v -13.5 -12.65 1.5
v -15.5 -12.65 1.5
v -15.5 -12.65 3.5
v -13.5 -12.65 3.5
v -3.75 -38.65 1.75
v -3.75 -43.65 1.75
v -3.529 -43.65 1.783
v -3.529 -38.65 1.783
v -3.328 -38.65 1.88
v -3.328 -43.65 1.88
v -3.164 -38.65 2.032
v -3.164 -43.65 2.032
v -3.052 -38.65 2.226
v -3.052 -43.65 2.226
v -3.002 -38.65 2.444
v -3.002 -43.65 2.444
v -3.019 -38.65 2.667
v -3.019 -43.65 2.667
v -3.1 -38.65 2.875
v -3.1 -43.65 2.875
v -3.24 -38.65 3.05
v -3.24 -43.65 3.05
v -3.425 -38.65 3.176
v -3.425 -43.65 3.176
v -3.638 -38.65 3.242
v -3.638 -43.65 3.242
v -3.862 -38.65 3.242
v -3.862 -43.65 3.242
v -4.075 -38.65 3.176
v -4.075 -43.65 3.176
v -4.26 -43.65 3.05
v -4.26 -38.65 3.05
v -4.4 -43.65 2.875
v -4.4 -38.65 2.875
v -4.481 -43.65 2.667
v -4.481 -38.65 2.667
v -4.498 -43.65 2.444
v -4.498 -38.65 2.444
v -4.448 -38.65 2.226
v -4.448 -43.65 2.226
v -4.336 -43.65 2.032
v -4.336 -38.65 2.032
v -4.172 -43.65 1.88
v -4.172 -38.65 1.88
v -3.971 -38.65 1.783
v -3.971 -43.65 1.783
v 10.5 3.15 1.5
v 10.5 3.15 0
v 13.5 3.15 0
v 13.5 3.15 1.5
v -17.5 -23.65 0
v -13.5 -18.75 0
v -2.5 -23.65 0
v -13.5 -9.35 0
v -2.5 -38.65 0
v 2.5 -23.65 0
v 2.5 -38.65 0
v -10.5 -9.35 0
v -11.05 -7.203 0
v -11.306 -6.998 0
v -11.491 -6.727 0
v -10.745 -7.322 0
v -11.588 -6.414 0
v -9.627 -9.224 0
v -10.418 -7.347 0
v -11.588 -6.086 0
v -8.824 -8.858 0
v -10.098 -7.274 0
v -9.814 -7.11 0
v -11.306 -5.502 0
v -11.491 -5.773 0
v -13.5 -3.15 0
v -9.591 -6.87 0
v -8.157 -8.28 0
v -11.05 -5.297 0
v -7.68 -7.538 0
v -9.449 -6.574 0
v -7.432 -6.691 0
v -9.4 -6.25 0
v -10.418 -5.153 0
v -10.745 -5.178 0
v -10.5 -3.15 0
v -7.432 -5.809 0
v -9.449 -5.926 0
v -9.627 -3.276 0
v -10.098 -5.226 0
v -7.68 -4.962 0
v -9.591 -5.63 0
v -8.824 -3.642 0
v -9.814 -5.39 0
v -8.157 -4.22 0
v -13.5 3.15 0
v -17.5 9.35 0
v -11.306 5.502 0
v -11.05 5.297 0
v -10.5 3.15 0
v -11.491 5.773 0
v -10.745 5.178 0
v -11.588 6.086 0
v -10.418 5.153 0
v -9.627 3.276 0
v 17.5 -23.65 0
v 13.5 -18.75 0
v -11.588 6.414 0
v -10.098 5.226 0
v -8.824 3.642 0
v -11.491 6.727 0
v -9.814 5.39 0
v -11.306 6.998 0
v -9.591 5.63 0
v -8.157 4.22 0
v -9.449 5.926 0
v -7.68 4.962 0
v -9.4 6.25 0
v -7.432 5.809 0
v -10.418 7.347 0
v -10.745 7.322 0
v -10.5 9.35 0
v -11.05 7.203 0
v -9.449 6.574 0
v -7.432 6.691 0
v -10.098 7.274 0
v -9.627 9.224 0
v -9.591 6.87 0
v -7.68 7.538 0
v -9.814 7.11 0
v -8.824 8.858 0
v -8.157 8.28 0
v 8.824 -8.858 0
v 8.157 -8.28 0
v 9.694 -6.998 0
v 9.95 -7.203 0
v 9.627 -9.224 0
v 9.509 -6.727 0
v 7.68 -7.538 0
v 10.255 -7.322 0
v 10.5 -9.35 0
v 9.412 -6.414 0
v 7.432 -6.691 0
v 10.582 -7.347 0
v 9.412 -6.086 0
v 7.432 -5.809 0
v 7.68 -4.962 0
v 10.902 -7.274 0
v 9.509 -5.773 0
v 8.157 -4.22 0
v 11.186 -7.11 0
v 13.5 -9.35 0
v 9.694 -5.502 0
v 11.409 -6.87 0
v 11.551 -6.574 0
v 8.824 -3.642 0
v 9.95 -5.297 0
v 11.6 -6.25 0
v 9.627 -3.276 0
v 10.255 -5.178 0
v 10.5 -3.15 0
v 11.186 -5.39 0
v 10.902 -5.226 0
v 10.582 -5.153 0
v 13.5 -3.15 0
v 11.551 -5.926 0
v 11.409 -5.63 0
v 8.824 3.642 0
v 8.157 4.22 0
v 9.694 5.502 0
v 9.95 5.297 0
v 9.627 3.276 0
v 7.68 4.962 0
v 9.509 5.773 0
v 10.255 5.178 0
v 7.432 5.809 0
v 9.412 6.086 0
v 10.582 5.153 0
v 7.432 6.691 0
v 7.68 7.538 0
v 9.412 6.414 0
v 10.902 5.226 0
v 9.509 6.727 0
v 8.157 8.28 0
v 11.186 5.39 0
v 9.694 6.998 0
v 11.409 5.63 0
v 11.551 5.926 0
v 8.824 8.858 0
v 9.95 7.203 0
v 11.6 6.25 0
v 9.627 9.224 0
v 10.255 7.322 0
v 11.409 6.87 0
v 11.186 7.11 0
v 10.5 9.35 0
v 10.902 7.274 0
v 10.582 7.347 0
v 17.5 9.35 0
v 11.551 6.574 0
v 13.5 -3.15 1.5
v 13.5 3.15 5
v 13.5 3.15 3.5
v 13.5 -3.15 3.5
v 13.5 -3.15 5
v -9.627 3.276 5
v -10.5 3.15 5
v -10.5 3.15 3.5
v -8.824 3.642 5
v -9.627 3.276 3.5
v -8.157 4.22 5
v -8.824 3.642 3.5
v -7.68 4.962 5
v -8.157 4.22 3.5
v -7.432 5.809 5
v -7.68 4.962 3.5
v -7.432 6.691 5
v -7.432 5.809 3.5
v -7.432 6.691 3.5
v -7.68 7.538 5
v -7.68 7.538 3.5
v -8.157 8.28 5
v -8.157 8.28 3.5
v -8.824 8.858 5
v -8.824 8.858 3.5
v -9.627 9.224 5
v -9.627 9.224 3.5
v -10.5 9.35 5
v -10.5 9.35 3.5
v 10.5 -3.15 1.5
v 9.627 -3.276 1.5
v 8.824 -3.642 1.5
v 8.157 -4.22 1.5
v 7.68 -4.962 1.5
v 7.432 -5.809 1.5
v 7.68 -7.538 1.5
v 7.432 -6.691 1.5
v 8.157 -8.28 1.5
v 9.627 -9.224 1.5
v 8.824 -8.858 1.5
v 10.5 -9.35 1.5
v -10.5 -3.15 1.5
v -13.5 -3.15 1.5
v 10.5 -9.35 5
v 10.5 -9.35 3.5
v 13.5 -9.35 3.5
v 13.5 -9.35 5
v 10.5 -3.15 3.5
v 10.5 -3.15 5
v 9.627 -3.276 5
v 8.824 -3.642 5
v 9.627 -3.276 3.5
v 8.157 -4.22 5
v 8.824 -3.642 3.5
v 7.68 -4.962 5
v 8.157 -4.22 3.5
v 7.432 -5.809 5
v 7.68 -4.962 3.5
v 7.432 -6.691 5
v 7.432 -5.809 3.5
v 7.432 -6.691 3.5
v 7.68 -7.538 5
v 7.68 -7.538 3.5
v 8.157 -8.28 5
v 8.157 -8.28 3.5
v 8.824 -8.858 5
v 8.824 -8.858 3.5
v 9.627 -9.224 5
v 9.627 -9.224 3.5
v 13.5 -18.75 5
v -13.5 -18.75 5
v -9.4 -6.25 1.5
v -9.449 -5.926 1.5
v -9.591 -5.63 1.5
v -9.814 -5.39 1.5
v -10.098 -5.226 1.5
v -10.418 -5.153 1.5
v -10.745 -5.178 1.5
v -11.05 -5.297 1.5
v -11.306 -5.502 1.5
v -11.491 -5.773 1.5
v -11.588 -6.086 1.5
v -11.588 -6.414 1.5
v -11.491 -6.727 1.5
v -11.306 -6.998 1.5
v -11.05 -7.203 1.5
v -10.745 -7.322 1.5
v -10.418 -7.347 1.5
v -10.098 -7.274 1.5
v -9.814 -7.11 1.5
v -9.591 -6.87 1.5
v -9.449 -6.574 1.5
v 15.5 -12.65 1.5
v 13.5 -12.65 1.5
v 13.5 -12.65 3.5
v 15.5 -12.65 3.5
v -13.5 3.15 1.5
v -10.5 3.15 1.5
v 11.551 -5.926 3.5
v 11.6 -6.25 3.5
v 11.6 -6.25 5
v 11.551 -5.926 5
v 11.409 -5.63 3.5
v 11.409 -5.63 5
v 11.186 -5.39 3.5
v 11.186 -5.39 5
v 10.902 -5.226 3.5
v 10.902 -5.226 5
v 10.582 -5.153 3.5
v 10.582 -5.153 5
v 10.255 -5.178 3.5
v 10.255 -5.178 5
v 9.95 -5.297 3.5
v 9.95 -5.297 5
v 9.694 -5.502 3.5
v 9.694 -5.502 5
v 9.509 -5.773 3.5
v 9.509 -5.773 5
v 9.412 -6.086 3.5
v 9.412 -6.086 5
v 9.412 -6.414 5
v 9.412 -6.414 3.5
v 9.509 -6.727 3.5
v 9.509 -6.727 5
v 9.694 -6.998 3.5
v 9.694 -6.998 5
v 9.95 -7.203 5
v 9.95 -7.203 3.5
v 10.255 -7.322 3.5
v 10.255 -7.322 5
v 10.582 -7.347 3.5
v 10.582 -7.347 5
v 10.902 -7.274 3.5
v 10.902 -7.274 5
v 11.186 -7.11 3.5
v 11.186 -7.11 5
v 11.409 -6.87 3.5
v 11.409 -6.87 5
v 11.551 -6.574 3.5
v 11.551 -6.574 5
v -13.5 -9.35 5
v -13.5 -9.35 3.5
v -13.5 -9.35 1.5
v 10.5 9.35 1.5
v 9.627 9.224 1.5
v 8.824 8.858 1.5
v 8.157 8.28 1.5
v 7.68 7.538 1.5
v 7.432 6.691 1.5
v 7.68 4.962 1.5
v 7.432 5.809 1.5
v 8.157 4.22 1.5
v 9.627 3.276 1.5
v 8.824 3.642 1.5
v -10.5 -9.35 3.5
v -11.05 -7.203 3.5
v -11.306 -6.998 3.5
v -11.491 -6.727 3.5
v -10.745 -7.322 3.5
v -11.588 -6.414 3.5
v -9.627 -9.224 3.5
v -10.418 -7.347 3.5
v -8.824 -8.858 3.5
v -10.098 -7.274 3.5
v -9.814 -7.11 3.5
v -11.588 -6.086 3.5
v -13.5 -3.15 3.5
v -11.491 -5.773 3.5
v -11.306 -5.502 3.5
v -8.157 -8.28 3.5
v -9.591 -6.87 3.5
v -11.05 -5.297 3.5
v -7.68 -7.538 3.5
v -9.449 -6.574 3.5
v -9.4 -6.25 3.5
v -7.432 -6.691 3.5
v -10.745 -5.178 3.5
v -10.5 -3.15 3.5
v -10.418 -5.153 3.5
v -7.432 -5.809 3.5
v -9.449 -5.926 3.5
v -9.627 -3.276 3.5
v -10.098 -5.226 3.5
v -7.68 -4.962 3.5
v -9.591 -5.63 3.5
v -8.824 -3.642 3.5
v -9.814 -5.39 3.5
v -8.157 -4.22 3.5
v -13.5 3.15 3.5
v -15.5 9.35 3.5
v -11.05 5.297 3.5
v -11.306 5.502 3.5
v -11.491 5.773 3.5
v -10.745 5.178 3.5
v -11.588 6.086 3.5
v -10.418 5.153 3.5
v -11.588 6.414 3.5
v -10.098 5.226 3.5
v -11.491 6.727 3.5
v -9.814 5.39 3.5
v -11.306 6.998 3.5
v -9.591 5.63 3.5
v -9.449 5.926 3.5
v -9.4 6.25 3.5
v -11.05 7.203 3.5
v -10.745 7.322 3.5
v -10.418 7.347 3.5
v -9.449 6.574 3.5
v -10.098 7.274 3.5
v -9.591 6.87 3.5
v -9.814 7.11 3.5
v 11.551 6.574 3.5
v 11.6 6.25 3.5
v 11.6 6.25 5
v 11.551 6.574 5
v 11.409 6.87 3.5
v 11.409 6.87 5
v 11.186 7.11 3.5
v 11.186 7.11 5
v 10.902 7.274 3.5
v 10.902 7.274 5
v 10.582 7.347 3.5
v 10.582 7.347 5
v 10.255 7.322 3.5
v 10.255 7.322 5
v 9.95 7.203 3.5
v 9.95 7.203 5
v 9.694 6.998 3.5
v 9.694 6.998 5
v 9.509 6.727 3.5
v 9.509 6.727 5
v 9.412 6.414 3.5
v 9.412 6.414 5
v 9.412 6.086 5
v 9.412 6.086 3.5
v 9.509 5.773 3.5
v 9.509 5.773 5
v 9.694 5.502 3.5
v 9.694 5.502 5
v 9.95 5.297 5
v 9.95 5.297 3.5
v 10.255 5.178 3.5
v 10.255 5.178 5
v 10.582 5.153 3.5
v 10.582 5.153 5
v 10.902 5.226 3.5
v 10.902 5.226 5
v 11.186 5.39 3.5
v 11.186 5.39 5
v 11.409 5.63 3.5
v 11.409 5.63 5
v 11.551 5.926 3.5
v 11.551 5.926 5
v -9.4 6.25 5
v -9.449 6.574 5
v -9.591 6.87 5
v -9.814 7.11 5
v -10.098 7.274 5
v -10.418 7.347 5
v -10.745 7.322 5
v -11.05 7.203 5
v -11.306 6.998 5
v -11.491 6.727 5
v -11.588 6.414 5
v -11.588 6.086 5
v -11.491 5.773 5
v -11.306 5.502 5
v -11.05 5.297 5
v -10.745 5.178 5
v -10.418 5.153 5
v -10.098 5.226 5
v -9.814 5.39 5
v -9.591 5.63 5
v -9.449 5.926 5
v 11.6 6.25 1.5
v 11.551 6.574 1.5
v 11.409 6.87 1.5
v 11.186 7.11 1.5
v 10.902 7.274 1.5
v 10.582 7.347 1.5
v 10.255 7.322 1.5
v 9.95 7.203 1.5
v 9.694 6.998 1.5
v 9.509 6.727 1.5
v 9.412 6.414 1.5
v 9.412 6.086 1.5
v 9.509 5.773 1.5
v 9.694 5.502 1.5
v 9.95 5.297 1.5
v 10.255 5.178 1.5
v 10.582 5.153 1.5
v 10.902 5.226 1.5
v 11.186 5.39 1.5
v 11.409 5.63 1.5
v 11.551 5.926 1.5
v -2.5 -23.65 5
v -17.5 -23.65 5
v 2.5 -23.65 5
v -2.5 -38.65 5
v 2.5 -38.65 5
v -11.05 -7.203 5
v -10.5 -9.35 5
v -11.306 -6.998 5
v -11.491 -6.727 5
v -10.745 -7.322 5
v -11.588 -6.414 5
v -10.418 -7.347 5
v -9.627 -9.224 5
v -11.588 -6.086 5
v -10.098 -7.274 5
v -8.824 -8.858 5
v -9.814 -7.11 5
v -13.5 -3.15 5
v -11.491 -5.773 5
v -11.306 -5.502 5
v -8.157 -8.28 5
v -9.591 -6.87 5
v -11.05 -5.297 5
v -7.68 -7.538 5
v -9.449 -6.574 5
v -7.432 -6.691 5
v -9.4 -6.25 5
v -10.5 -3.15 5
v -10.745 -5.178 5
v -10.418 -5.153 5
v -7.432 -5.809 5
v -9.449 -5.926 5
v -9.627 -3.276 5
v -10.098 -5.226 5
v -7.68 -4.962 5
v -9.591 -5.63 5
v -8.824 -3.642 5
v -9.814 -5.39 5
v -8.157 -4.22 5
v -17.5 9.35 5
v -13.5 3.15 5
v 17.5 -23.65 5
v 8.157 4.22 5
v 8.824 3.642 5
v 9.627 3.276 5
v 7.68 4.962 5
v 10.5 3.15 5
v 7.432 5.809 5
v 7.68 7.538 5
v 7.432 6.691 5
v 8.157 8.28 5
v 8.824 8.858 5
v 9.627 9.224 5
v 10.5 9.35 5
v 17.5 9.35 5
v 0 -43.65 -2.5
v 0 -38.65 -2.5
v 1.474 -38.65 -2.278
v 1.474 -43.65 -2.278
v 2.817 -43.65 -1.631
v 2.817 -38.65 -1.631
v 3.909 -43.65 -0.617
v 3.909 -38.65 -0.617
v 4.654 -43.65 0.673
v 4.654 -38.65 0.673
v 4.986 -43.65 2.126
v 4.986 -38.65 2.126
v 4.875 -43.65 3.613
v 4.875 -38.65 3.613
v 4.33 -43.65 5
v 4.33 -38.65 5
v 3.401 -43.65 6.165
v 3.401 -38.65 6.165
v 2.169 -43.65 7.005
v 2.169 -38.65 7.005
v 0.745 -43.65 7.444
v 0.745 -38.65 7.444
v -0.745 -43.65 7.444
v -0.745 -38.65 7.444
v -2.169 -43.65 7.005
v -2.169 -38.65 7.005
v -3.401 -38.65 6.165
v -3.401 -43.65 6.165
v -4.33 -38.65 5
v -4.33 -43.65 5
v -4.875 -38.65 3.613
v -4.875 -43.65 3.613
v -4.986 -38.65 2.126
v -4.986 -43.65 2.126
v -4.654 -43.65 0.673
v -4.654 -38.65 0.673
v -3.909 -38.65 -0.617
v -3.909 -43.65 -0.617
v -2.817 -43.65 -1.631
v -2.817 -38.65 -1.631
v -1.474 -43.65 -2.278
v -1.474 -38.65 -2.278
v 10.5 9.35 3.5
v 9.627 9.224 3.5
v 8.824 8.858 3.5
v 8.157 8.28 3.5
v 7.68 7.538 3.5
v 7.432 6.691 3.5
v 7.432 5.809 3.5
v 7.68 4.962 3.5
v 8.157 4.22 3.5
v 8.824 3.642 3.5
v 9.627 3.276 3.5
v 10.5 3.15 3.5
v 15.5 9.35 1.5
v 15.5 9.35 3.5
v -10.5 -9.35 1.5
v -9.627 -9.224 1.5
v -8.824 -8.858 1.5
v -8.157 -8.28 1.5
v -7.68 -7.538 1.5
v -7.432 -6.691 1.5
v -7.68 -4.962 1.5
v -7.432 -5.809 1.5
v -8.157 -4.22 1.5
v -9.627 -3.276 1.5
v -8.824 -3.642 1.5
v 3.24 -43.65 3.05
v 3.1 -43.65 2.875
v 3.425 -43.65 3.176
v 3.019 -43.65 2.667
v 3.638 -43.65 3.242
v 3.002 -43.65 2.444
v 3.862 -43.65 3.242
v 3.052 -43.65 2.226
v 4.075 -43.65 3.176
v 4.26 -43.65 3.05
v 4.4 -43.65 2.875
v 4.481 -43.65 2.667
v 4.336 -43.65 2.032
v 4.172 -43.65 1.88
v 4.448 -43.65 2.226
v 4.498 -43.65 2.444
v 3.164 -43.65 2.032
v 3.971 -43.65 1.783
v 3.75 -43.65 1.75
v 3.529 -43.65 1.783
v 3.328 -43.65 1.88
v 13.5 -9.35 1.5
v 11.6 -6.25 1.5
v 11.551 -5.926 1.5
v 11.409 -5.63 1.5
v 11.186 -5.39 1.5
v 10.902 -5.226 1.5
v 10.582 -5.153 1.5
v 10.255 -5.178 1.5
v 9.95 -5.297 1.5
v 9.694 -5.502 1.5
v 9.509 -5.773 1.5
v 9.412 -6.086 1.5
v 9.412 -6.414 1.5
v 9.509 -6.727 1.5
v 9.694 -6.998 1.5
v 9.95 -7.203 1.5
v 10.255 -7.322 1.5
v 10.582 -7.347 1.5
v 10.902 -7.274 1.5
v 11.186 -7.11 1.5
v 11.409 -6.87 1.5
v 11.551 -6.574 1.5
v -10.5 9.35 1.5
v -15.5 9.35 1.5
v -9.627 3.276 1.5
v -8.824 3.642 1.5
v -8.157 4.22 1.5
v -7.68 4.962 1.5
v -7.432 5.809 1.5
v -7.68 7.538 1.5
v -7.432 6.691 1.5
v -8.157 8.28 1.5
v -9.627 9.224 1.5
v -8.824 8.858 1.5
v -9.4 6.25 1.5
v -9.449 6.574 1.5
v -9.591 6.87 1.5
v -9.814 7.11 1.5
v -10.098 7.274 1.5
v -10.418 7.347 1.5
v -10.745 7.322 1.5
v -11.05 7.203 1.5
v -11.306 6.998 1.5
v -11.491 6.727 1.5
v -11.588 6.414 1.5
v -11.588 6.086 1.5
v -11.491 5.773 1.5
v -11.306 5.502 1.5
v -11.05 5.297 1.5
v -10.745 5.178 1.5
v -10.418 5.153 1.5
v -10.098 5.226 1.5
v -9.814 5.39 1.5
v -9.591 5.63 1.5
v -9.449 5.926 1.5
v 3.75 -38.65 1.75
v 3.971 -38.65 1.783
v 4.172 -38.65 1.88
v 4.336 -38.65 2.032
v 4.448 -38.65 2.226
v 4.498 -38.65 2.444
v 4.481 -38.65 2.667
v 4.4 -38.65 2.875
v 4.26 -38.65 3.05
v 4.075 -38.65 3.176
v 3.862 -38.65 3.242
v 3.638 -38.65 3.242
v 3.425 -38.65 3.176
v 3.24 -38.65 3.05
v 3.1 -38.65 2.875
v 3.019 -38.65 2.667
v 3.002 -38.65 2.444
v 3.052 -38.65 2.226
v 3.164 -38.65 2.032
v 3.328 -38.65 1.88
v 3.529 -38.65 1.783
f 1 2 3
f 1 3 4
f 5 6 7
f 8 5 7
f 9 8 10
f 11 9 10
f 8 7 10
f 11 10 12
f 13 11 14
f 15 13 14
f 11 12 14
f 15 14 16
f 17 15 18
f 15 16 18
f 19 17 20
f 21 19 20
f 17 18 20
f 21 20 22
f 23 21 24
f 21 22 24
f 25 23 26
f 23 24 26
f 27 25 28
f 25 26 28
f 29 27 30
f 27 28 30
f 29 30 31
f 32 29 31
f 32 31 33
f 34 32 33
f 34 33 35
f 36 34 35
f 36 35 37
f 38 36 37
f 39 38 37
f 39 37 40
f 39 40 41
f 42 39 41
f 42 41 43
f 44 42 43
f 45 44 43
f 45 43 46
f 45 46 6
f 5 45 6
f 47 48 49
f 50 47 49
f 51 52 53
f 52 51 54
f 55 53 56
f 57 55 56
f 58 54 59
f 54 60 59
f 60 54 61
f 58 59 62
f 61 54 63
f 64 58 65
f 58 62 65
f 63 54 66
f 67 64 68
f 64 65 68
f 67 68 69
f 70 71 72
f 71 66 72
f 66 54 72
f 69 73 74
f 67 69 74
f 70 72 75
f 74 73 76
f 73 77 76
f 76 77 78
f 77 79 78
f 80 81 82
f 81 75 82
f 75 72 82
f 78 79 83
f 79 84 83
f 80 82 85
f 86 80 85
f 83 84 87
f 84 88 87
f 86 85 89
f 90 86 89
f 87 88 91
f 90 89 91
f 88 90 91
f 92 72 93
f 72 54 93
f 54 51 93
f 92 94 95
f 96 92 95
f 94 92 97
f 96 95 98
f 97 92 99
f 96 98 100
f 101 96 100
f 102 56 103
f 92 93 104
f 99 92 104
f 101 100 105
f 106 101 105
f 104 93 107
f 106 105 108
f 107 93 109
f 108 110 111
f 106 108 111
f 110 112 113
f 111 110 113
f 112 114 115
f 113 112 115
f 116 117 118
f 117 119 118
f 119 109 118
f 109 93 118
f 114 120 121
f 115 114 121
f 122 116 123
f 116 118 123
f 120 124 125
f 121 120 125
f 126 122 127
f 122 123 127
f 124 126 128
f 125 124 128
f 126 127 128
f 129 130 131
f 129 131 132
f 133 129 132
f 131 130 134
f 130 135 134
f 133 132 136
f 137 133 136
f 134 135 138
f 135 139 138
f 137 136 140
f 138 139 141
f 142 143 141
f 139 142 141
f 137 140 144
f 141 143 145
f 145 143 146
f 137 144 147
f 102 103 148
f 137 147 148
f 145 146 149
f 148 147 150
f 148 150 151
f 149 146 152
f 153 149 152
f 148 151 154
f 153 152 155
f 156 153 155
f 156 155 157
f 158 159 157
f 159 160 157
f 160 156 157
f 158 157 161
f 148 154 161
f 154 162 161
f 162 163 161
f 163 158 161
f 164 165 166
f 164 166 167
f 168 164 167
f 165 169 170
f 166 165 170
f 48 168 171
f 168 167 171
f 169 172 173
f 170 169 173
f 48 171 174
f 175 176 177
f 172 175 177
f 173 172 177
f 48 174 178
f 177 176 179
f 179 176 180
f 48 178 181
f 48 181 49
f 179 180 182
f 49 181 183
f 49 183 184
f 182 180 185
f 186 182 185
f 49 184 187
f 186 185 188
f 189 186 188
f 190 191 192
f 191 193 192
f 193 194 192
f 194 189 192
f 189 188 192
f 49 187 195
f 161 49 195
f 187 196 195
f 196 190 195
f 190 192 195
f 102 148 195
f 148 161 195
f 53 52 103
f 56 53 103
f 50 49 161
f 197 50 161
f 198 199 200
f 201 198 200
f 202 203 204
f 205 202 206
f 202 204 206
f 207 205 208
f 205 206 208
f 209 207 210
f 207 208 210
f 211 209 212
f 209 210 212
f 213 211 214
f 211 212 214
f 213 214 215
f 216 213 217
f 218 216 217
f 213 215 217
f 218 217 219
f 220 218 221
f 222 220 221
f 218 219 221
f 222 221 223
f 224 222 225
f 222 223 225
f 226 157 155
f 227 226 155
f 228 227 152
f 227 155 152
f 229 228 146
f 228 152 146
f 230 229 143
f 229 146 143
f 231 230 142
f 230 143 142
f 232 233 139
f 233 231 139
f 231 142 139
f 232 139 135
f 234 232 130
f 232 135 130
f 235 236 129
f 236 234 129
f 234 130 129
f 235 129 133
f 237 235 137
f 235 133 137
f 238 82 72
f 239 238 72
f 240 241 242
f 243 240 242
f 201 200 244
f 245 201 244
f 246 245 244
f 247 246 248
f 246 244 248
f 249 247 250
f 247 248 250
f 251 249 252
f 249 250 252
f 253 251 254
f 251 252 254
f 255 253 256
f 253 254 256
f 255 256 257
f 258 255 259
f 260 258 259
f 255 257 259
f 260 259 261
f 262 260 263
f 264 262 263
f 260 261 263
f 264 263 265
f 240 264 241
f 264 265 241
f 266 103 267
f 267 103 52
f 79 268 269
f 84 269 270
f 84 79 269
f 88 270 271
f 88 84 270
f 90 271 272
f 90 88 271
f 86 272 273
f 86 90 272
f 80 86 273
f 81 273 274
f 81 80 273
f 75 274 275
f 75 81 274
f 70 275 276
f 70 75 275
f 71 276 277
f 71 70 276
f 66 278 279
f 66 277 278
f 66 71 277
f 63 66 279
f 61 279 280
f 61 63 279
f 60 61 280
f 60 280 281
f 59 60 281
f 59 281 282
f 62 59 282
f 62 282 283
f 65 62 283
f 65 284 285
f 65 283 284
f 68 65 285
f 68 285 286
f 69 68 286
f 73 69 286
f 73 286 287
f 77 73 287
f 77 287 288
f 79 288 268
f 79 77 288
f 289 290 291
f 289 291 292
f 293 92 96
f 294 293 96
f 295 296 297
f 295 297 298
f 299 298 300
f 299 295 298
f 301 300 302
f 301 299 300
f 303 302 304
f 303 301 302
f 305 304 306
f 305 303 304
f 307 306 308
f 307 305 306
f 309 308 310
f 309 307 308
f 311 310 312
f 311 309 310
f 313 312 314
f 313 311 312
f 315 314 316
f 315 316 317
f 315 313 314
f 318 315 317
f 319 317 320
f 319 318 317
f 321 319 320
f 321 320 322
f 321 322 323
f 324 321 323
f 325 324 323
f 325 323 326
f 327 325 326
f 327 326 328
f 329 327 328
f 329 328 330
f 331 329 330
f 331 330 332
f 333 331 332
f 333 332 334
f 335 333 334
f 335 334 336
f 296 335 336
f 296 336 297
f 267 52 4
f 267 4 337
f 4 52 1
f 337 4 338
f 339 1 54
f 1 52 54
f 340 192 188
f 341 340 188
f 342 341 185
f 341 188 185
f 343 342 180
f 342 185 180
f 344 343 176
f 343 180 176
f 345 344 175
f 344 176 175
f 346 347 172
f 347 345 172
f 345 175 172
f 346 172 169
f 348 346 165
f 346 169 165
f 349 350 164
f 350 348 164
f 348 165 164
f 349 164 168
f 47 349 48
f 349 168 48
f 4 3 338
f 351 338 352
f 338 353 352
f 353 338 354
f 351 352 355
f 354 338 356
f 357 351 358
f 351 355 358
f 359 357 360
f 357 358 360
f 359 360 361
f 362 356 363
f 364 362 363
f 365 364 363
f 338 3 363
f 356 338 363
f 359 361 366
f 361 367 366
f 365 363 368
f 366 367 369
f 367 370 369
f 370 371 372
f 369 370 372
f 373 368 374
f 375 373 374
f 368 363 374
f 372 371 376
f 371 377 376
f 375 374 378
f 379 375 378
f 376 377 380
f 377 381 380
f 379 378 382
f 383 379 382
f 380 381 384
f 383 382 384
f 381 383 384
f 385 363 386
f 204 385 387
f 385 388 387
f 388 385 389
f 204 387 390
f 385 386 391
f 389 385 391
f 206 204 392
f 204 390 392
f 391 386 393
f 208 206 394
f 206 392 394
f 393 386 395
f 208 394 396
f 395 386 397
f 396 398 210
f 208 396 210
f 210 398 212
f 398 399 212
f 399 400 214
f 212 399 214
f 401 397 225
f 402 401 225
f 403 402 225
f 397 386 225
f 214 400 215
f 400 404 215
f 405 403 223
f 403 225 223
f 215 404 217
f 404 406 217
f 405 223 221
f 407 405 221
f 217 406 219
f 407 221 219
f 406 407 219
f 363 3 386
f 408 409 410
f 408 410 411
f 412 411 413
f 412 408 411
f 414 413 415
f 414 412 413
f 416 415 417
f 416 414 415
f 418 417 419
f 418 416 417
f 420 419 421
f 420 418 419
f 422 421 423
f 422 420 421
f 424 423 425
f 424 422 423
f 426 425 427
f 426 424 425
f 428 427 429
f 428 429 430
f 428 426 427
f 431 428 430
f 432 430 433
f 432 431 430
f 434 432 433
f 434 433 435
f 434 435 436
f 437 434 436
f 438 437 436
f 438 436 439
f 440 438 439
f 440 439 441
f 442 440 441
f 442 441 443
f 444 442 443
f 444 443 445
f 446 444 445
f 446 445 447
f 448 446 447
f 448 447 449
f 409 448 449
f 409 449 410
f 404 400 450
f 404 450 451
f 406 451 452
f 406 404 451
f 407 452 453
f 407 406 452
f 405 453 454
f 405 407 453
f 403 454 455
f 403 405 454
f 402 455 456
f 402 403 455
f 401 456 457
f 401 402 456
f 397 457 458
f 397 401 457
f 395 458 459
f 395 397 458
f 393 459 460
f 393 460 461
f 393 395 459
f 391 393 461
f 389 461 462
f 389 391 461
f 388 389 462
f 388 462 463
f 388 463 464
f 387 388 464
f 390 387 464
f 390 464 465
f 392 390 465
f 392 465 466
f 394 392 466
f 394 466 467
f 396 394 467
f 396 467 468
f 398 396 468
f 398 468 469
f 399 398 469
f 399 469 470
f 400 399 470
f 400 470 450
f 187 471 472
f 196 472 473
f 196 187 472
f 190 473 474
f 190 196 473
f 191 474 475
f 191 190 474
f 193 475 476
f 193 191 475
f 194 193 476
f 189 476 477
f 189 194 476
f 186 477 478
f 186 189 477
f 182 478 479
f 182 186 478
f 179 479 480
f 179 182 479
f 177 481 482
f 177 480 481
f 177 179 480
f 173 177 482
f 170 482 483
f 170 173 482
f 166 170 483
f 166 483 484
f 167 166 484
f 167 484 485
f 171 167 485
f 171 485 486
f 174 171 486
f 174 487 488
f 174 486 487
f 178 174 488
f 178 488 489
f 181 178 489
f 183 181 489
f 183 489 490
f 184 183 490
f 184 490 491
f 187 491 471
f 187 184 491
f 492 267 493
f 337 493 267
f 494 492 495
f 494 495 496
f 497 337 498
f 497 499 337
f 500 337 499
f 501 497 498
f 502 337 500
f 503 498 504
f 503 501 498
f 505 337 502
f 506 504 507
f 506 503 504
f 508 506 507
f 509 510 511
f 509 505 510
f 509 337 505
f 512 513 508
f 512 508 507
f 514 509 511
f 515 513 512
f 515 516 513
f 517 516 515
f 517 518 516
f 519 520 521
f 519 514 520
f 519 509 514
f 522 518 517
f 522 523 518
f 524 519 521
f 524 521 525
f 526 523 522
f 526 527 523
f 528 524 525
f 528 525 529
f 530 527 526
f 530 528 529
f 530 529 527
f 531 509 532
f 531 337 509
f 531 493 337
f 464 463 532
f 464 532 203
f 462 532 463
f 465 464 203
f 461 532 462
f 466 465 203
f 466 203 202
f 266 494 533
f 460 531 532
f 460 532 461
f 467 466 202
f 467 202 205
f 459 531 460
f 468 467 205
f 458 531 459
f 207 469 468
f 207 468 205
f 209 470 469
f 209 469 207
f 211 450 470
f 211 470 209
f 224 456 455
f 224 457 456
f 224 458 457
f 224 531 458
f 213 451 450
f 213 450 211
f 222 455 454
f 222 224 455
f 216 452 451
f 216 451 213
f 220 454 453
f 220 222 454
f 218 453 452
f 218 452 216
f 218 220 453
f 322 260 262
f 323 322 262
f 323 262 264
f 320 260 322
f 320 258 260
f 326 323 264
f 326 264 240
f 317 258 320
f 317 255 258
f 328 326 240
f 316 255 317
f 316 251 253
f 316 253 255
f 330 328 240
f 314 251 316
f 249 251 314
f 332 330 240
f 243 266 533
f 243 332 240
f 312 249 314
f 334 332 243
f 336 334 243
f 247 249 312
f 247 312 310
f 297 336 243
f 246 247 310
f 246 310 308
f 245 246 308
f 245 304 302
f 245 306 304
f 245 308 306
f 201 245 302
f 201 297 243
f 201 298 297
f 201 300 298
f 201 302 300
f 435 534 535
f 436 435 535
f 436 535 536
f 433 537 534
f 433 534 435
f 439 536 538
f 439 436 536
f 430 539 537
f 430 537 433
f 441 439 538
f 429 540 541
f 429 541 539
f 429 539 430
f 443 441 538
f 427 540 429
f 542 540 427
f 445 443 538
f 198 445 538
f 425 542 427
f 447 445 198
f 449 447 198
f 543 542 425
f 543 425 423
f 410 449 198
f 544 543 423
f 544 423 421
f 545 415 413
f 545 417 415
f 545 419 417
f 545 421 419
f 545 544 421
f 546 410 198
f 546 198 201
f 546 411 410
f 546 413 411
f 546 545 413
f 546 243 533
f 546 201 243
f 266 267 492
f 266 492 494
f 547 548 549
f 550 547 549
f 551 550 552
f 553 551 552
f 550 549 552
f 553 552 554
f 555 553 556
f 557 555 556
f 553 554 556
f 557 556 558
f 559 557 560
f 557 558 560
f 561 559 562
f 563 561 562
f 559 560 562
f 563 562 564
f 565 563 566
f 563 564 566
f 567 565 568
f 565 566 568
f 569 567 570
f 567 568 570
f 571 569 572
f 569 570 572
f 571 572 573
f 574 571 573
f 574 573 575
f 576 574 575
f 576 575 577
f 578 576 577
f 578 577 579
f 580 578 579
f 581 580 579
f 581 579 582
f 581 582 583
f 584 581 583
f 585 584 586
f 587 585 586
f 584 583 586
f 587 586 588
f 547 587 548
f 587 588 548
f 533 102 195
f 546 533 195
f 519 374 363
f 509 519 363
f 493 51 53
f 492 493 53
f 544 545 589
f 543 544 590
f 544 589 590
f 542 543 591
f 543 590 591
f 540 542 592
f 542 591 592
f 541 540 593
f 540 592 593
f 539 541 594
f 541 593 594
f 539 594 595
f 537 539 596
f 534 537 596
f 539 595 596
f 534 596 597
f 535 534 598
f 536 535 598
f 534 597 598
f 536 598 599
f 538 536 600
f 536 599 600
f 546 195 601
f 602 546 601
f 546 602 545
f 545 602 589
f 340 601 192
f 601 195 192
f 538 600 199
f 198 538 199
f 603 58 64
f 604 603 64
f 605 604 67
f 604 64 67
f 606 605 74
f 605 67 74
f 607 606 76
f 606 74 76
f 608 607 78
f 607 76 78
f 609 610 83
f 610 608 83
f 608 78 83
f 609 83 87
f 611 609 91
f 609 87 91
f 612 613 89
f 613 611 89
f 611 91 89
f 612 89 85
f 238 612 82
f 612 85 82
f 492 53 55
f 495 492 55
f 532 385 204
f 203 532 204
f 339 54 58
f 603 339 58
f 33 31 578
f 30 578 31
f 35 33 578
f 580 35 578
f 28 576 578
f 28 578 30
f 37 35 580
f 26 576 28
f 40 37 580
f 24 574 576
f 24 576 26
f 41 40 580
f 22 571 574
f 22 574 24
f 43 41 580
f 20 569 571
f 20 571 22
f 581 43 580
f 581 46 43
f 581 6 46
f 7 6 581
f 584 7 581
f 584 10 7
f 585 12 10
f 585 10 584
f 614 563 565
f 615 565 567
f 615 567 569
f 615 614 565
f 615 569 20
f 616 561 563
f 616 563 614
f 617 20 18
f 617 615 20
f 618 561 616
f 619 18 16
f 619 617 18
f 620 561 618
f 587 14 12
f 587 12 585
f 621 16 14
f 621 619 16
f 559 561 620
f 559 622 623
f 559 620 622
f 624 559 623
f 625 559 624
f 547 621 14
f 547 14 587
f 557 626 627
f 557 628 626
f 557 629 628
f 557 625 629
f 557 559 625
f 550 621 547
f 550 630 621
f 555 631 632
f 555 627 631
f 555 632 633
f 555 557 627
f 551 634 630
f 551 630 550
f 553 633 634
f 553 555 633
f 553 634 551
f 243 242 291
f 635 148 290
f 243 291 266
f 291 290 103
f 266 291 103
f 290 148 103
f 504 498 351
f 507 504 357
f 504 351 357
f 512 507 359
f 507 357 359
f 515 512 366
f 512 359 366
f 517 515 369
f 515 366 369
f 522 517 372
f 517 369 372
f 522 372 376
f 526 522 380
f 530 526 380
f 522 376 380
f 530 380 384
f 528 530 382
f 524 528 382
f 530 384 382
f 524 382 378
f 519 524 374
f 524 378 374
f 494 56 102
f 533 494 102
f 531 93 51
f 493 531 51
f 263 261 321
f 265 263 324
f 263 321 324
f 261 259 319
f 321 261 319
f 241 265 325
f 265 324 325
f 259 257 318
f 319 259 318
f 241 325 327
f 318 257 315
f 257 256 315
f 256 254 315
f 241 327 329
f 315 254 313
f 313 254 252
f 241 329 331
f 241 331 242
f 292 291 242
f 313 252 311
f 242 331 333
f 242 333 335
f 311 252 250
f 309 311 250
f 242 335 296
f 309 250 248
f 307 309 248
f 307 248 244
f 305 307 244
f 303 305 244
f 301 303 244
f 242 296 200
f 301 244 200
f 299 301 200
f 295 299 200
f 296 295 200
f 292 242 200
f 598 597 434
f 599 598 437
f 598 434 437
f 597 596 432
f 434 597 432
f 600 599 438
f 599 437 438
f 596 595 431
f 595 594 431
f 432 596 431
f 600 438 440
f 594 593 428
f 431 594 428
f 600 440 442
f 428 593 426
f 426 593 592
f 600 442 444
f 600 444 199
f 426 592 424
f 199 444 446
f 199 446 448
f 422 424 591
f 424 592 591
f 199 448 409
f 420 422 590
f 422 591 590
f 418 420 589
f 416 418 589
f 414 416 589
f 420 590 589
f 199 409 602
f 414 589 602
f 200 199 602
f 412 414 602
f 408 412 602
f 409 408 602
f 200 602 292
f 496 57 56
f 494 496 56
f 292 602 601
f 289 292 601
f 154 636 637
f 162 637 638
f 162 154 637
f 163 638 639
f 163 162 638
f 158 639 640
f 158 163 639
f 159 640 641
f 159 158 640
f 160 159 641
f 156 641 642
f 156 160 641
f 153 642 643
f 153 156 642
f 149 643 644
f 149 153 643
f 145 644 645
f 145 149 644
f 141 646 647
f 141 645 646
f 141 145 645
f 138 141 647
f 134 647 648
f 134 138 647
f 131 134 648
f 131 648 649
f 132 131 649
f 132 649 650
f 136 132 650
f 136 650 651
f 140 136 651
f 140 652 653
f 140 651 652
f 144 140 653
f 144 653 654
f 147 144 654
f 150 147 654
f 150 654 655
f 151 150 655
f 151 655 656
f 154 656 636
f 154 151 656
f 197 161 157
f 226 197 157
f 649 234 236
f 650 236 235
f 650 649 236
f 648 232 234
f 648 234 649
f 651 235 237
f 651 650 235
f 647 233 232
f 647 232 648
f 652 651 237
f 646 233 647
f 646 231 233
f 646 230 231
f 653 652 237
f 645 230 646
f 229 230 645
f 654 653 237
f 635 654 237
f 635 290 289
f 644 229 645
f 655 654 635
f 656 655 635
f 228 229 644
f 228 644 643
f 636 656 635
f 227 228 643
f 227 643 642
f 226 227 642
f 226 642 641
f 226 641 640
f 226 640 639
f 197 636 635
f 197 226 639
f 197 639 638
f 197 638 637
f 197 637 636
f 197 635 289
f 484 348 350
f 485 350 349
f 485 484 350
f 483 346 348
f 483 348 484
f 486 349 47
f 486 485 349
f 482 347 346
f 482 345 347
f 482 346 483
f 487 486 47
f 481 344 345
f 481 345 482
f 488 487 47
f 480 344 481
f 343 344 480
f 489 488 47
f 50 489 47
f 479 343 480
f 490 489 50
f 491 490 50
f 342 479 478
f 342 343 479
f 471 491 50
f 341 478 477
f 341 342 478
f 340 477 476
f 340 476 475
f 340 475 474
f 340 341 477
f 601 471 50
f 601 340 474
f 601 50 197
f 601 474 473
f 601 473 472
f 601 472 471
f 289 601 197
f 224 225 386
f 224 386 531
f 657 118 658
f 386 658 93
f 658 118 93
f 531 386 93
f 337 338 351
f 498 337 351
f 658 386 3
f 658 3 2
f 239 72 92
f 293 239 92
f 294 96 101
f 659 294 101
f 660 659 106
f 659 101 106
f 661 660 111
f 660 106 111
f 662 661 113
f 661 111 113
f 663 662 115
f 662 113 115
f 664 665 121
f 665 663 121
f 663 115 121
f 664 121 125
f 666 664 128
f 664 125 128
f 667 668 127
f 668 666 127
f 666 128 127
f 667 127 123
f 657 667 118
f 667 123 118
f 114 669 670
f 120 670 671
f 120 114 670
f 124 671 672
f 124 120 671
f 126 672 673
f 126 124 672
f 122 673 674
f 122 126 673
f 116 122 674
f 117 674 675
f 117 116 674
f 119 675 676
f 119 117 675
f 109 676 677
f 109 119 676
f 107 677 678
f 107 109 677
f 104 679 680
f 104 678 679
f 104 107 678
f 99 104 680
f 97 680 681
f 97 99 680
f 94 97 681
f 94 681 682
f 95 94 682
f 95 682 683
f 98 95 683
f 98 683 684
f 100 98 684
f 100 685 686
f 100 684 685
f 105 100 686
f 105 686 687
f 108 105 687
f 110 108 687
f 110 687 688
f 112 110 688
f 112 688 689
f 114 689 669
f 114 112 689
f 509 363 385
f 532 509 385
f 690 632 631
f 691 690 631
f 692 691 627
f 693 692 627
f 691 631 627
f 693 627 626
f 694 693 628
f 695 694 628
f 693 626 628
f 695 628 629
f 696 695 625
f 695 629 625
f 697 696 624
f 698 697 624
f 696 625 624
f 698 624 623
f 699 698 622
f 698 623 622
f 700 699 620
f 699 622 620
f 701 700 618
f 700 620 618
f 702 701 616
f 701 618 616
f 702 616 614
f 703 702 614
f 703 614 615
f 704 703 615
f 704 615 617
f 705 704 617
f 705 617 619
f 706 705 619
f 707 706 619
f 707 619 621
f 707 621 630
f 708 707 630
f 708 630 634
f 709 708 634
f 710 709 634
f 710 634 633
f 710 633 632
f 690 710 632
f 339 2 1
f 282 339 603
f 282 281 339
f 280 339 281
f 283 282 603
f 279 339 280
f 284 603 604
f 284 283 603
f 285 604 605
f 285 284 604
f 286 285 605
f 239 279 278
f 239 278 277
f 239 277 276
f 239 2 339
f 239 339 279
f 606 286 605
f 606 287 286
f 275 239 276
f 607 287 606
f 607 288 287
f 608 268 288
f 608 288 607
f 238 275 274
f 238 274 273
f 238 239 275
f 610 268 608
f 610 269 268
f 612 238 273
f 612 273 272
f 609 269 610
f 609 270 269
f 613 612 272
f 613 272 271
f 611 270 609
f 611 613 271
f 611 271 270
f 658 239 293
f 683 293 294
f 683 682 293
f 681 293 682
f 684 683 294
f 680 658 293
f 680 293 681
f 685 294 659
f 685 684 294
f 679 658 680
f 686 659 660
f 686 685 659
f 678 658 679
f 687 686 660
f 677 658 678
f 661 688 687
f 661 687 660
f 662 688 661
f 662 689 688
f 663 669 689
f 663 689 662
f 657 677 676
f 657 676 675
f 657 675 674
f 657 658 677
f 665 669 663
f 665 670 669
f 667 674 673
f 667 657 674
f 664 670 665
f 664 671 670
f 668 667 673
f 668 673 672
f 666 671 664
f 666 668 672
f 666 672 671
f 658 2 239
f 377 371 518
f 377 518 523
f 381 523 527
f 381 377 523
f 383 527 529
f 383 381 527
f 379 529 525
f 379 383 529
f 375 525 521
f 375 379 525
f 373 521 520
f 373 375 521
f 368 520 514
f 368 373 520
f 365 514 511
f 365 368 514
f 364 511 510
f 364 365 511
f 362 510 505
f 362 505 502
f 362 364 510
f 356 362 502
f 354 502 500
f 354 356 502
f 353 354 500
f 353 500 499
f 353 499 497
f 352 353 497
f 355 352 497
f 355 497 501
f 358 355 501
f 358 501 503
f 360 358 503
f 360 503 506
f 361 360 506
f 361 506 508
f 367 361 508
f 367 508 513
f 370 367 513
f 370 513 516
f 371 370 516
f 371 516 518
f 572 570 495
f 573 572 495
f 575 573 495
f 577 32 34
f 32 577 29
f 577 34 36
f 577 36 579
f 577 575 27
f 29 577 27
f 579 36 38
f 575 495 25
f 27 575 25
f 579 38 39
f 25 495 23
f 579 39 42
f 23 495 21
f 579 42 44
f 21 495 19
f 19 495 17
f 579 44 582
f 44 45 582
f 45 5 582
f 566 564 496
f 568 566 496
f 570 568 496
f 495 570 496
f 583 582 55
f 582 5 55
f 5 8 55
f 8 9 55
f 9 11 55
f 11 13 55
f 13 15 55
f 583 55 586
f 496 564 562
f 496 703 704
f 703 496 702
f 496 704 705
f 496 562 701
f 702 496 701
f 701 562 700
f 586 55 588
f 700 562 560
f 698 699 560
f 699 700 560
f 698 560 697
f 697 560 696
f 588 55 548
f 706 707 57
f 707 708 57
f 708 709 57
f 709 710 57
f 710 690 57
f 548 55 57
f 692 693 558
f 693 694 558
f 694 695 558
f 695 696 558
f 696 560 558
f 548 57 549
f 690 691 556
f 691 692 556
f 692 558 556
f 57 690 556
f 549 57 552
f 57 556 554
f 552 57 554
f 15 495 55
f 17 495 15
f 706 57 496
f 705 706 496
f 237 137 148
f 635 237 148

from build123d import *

# Parameters (mm, degrees)
SKETCH1_R                 = 1.1
BOSS_EXTRUDE1_DEPTH       = 5
SKETCH2_W                 = 31
SKETCH2_H                 = 2
CUT_EXTRUDE1_DEPTH        = 22
SKETCH4_R                 = 5
BOSS_EXTRUDE2_DEPTH       = 5
F_1_5MM_DOWEL_HOLE1_D     = 1.5
F_1_5MM_DOWEL_HOLE1_DEPTH = 5


with BuildPart() as part:
    # Sketch1 → Boss-Extrude1 (new body)
    with BuildSketch(Plane.XY):
        with BuildLine():
            Line((-10.5, 9.35), (-17.5, 9.35))
            Line((-17.5, 9.35), (-17.5, -23.65))
            Line((-17.5, -23.65), (-2.5, -23.65))
            Line((-2.5, -23.65), (-2.5, -38.65))
            Line((-2.5, -38.65), (2.5, -38.65))
            Line((2.5, -38.65), (2.5, -23.65))
            Line((2.5, -23.65), (17.5, -23.65))
            Line((17.5, -23.65), (17.5, 9.35))
            Line((17.5, 9.35), (10.5, 9.35))
            ThreePointArc((10.5, 9.35), (7.4, 6.25), (10.5, 3.15))
            Line((10.5, 3.15), (13.5, 3.15))
            Line((13.5, 3.15), (13.5, -3.15))
            Line((13.5, -3.15), (10.5, -3.15))
            ThreePointArc((10.5, -3.15), (7.4, -6.25), (10.5, -9.35))
            Line((10.5, -9.35), (13.5, -9.35))
            Line((13.5, -9.35), (13.5, -18.75))
            Line((13.5, -18.75), (-13.5, -18.75))
            Line((-13.5, -18.75), (-13.5, -9.35))
            Line((-13.5, -9.35), (-10.5, -9.35))
            ThreePointArc((-10.5, -9.35), (-7.4, -6.25), (-10.5, -3.15))
            Line((-10.5, -3.15), (-13.5, -3.15))
            Line((-13.5, -3.15), (-13.5, 3.15))
            Line((-13.5, 3.15), (-10.5, 3.15))
            ThreePointArc((-10.5, 3.15), (-7.4, 6.25), (-10.5, 9.35))
        make_face()
        with Locations((-10.5, 6.25)):
            Circle(SKETCH1_R, mode=Mode.SUBTRACT)
        with Locations((10.5, 6.25)):
            Circle(SKETCH1_R, mode=Mode.SUBTRACT)
        with Locations((10.5, -6.25)):
            Circle(SKETCH1_R, mode=Mode.SUBTRACT)
        with Locations((-10.5, -6.25)):
            Circle(SKETCH1_R, mode=Mode.SUBTRACT)
    extrude(amount=BOSS_EXTRUDE1_DEPTH)

    # Sketch2 → Cut-Extrude1 (cut)
    with BuildSketch(Plane(origin=(0, 9.35, 0), x_dir=(1, 0, 0), z_dir=(0, 1, 0))):
        with Locations((0, -2.5)):
            Rectangle(SKETCH2_W, SKETCH2_H)
    extrude(amount=-CUT_EXTRUDE1_DEPTH, mode=Mode.SUBTRACT)

    # Sketch4 → Boss-Extrude2 (add)
    with BuildSketch(Plane.XZ.offset(38.65)):
        with Locations(Location((0, 2.5, 0), (0, 0, 270))):
            Circle(SKETCH4_R)
    extrude(amount=BOSS_EXTRUDE2_DEPTH)

    # Ø1.5mm Dowel Hole1
    with Locations(Plane(origin=(3.75, -38.65, 2.5), x_dir=(0, 0, 1), z_dir=(0, 1, 0))):
        with Locations((0, 0), (0, -7.5)):
            Hole(F_1_5MM_DOWEL_HOLE1_D / 2, depth=F_1_5MM_DOWEL_HOLE1_DEPTH)


solid = part.part
